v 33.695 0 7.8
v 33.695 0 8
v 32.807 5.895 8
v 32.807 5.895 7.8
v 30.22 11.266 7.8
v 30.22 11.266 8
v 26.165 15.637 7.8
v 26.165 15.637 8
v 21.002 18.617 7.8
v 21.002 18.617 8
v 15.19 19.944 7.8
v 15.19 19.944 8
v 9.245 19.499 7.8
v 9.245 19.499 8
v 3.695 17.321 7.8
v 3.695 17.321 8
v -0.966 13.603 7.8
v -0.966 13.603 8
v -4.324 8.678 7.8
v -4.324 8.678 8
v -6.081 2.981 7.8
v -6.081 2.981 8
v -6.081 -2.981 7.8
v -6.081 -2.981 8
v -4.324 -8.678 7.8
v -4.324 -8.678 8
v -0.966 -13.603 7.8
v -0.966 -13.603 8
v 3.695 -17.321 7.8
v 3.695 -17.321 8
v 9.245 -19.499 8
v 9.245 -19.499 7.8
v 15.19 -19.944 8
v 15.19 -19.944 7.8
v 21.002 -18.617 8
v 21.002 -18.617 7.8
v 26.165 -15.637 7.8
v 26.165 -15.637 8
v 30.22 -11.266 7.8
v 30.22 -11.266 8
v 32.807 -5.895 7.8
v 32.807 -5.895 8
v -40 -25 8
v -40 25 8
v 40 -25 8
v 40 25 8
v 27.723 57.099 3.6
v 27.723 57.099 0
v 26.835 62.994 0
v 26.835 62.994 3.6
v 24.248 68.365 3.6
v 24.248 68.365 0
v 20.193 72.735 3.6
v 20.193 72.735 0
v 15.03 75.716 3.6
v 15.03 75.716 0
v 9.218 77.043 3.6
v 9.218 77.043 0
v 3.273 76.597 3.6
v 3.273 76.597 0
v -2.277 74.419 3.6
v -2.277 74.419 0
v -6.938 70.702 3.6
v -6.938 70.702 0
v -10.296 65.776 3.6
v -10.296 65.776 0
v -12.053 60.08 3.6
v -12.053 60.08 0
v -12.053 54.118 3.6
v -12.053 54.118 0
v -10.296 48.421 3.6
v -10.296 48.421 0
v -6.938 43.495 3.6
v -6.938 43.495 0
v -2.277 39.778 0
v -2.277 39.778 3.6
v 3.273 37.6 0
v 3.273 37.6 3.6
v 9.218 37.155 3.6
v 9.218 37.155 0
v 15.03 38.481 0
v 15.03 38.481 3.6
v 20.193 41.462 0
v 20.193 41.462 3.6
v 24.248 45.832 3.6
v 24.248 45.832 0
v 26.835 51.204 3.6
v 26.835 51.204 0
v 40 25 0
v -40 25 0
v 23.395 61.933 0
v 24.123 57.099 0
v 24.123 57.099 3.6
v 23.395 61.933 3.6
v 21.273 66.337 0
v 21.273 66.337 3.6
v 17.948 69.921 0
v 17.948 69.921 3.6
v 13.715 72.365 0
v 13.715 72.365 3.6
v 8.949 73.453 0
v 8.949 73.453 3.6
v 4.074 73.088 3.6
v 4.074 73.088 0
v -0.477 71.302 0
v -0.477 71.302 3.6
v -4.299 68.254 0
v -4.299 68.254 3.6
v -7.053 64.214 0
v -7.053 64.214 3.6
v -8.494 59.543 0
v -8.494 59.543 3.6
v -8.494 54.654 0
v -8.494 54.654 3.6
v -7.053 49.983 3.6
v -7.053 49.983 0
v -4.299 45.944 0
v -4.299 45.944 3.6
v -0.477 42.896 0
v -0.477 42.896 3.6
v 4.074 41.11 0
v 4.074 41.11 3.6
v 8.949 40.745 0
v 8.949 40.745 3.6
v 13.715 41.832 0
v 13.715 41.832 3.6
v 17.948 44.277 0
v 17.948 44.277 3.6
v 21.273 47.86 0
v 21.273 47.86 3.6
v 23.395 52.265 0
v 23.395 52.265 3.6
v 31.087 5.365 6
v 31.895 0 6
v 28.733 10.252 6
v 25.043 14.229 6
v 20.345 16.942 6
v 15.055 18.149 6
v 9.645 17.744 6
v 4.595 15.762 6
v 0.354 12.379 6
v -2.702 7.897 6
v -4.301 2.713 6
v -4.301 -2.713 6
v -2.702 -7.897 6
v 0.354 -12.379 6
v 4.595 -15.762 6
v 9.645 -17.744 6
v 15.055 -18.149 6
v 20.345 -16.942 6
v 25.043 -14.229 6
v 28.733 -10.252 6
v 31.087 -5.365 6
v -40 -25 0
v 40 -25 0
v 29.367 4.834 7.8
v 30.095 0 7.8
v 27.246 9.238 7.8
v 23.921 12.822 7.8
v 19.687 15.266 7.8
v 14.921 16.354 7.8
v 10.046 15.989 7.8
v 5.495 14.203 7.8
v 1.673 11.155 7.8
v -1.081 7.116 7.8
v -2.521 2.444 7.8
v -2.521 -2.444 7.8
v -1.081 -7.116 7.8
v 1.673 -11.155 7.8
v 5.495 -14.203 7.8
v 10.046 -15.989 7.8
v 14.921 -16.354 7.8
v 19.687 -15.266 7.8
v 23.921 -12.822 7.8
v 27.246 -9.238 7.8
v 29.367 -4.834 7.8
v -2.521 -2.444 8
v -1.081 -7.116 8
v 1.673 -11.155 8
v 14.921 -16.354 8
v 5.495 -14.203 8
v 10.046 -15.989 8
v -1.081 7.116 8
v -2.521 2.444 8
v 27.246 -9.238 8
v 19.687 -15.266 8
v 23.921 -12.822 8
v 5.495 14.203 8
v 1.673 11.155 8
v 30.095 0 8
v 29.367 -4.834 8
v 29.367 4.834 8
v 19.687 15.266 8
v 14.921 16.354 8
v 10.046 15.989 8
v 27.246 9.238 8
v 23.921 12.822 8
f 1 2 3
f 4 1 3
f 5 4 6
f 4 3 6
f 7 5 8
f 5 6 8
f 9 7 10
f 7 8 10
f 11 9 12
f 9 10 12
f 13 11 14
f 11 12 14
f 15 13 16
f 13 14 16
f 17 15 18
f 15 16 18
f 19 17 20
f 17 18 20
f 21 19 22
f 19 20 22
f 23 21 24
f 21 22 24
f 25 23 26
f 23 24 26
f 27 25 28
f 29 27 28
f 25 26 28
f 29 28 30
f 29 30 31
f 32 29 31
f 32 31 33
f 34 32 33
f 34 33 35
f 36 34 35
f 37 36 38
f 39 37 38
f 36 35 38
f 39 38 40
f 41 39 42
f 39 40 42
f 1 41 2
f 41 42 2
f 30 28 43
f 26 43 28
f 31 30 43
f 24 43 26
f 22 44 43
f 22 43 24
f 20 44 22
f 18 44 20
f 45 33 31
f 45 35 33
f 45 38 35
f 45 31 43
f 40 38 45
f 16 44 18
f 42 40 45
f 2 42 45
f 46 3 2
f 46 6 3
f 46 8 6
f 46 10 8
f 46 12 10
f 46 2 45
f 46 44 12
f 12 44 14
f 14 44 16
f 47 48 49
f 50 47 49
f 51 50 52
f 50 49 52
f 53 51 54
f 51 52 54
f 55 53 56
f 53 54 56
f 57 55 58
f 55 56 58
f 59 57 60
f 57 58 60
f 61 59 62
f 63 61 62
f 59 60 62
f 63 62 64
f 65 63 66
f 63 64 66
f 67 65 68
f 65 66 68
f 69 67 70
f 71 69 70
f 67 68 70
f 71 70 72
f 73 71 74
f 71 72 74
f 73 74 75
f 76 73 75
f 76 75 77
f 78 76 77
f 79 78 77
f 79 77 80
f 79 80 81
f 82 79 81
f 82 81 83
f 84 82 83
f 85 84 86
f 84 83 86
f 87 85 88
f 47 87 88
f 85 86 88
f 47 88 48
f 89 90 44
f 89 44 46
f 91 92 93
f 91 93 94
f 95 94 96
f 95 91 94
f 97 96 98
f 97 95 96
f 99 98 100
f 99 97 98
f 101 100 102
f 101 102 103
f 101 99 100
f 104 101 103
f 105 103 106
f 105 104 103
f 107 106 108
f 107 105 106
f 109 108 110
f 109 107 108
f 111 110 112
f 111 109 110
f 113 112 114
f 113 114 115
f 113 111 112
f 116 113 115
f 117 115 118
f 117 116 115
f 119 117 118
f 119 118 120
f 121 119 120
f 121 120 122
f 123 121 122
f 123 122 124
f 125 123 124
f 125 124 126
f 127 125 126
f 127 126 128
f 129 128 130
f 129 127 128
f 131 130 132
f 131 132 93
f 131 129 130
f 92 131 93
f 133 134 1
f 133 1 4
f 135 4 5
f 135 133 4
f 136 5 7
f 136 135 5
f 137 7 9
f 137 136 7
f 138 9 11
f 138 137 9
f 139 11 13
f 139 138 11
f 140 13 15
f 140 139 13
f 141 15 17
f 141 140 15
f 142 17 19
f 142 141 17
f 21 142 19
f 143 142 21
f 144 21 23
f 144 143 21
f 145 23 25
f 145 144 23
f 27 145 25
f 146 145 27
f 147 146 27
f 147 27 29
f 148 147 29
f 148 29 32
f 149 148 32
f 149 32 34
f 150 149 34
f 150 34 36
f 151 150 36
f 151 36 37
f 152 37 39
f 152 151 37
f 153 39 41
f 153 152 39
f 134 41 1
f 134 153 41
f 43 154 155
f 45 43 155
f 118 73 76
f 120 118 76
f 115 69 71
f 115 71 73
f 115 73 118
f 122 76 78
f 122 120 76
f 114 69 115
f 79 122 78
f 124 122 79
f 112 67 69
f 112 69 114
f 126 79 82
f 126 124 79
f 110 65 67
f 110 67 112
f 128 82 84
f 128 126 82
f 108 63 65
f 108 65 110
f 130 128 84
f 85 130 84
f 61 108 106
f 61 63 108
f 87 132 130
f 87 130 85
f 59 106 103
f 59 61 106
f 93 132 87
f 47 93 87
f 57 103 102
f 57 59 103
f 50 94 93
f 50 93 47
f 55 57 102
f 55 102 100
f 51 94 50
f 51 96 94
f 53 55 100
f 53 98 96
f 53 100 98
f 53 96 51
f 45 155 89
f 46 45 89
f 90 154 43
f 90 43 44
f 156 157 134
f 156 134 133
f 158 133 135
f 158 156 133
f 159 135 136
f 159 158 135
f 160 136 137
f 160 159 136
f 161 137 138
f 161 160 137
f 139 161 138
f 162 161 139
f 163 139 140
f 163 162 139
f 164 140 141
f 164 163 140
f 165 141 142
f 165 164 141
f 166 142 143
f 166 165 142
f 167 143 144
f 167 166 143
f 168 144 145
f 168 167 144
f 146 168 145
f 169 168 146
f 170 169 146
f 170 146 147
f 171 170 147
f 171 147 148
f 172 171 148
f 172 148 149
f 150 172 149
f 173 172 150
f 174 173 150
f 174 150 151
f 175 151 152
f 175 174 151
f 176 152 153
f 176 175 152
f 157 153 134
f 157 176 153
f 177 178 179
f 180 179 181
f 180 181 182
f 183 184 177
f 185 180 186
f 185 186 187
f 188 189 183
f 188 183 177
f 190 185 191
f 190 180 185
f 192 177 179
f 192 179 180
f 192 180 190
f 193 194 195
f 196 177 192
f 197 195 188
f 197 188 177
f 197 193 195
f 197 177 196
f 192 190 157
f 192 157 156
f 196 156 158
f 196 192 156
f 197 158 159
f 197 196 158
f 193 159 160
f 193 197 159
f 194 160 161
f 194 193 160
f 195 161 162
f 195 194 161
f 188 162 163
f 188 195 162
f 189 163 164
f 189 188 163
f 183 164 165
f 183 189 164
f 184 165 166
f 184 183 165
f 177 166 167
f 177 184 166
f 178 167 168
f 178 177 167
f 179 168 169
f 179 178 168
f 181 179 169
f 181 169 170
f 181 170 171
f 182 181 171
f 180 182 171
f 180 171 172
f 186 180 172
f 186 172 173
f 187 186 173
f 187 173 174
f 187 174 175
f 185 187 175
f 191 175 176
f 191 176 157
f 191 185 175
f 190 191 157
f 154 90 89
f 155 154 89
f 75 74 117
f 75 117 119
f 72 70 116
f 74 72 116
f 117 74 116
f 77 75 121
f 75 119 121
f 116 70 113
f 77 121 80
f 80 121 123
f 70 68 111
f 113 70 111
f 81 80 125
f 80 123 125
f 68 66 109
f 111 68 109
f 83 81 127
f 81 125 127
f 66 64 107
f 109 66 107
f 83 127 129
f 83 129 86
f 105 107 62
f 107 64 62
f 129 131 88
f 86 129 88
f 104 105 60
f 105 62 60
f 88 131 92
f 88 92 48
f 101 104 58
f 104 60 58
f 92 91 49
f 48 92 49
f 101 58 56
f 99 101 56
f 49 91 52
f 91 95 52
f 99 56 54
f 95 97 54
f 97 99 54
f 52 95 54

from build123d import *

# Parameters (mm, degrees)
F0_W     = 80
F0_H     = 50
F1_DEPTH = 8
F2_R     = 20
F2_R_2   = 16.4
F3_DEPTH = 3.6
F4_R     = 20
F4_R_2   = 16.4
F5_DEPTH = 2
F6_SIZE  = 1.79999


# Not quite as in the source:
# - a fillet or chamfer is up to 0.001 mm smaller than in the source, because OpenCascade refuses the exact size


with BuildPart() as f1:
    # F0 (on Top) → F1 (new body)
    with BuildSketch(Plane.XY):
        Rectangle(F0_W, F0_H)
    extrude(amount=F1_DEPTH)

    # F4 (on face) → F5 (cut)
    with BuildSketch(Plane.XY.offset(8)):
        with Locations((13.69535923, 0)):
            Circle(F4_R)
        with Locations((13.69535923, 0)):
            Circle(F4_R_2, mode=Mode.SUBTRACT)
    extrude(amount=-F5_DEPTH, mode=Mode.SUBTRACT)

    # F6 (size 1.8 in the source; OpenCascade refuses exactly that, so slightly less here)
    f6_edges = [f1.edges().sort_by_distance(p)[0] for p in [
        (-6.304641, 0, 6),
        (-2.704641, 0, 6),
    ]]
    chamfer(f6_edges, length=F6_SIZE)


with BuildPart() as f3:
    # F2 (on Top) → F3 (new body)
    with BuildSketch(Plane.XY):
        with Locations((7.7231763862, 57.0987015963)):
            Circle(F2_R)
        with Locations((7.7231763862, 57.0987015963)):
            Circle(F2_R_2, mode=Mode.SUBTRACT)
    extrude(amount=F3_DEPTH)


solid = Compound([f1.part, f3.part])
